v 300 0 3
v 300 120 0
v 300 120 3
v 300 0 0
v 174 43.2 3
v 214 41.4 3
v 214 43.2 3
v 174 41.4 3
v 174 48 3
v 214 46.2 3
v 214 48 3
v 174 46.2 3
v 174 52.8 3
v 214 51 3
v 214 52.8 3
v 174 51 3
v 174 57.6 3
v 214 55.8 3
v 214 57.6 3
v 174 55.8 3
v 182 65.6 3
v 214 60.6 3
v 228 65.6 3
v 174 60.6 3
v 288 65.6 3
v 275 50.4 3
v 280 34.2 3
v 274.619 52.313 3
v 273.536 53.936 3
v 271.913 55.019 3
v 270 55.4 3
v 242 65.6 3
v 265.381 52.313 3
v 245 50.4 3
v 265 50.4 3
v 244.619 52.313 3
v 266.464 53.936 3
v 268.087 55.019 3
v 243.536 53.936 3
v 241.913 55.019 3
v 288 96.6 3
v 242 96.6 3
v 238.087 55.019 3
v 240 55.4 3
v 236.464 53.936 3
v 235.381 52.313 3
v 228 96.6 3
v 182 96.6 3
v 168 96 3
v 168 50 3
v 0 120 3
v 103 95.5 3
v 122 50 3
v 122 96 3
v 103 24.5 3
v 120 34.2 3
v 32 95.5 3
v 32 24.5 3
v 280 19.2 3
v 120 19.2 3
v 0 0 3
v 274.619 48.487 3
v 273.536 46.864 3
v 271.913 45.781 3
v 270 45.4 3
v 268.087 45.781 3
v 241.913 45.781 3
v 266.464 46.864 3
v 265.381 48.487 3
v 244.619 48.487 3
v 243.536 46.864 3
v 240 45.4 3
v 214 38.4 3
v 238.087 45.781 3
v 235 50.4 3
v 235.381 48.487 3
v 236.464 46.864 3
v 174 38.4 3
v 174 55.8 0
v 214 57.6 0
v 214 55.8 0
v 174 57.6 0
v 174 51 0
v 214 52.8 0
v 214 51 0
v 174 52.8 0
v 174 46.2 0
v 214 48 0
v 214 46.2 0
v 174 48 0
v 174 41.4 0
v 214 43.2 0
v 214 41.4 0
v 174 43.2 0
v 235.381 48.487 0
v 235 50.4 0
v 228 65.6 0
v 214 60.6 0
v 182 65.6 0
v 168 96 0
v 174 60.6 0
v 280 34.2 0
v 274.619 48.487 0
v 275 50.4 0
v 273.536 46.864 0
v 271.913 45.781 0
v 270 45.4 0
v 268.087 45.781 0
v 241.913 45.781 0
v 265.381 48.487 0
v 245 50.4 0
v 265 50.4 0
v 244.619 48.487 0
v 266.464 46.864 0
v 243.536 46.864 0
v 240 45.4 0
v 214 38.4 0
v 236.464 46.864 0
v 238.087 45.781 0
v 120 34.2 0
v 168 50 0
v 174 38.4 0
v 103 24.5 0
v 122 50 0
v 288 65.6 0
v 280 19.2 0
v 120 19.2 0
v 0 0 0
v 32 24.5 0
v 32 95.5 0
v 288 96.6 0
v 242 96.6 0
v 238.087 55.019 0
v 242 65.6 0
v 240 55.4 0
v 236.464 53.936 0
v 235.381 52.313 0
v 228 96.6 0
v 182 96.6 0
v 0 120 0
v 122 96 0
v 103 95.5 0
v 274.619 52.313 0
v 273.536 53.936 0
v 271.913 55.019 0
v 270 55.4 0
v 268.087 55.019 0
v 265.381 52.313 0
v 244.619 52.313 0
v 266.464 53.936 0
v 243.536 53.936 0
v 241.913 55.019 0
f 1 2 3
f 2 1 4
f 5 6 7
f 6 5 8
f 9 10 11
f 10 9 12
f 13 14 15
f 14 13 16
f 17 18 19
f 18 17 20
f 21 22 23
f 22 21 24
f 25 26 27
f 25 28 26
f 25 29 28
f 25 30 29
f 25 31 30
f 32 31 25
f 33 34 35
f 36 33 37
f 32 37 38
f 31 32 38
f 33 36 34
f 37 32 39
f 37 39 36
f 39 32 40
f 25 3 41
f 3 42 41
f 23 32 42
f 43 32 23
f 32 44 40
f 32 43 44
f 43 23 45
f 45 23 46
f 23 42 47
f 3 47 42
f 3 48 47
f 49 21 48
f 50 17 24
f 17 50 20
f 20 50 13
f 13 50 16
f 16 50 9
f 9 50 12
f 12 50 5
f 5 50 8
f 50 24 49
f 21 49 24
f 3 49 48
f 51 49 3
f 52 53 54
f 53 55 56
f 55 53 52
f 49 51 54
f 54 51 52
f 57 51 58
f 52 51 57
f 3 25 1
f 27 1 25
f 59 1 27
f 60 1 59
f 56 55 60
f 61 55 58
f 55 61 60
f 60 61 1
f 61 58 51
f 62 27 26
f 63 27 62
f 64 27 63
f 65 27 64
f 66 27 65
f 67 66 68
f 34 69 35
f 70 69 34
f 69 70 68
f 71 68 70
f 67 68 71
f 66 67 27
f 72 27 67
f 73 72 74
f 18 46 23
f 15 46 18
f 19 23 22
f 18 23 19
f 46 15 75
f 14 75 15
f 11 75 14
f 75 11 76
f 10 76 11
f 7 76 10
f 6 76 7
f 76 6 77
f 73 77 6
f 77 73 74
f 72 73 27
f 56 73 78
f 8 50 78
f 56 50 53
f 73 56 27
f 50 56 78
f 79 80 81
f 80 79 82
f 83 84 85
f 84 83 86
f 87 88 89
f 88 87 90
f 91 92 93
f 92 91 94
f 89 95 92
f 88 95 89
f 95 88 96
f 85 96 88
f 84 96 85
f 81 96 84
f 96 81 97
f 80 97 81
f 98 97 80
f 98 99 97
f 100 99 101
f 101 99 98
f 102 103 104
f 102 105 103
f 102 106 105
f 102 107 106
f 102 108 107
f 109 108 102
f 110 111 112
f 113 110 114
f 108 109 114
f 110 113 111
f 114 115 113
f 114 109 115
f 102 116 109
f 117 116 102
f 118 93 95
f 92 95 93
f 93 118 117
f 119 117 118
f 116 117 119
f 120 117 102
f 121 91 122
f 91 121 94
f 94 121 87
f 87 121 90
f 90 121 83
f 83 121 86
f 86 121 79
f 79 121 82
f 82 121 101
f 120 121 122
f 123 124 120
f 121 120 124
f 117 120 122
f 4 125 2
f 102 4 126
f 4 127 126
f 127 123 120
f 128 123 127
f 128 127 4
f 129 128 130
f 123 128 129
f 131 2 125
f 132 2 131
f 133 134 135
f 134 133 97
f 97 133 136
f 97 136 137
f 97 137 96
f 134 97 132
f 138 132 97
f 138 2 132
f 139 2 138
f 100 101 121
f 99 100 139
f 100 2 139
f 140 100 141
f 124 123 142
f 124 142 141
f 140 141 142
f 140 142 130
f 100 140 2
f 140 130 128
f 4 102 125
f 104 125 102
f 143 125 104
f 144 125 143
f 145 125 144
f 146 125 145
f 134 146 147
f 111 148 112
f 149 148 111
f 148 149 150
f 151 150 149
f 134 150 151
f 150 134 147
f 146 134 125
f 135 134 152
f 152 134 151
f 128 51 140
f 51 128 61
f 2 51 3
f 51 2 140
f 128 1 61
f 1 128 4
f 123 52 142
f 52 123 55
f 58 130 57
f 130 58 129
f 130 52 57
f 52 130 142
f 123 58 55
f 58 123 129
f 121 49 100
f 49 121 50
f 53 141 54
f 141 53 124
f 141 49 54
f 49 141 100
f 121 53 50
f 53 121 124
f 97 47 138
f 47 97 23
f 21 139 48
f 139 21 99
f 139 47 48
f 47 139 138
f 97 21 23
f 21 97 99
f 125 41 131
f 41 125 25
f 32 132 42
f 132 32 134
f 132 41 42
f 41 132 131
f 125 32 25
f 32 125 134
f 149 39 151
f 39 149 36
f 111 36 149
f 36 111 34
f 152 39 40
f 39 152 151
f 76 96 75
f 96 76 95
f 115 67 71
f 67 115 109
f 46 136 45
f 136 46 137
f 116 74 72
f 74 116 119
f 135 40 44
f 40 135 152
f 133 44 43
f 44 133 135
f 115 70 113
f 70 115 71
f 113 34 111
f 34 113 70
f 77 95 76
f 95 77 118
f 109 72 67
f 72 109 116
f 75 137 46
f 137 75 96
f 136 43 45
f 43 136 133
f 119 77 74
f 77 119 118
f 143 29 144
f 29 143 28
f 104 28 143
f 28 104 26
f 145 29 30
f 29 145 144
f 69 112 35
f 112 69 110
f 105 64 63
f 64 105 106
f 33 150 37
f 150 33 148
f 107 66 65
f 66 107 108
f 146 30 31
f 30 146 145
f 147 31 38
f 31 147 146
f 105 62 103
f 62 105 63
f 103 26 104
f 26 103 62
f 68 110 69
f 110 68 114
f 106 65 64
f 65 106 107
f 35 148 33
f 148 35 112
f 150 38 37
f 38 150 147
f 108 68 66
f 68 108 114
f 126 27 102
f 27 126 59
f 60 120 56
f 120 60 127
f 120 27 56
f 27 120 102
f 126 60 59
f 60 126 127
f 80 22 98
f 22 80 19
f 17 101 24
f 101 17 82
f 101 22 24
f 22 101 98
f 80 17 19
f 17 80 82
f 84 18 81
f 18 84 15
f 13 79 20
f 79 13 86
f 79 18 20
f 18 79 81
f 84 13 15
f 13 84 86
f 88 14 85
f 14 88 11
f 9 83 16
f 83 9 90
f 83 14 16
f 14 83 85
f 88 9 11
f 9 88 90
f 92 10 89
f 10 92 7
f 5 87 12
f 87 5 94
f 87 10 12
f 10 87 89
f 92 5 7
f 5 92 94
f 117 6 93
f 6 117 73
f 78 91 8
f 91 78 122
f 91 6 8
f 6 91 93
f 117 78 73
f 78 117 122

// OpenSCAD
/*
Carbonite control panels

1" = 25.4mm

maximums:
length: 15" (381mm)
width: 5" (127mm)
height: 2"
*/

BASE_LENGTH = 300;
BASE_WIDTH = 120;
BASE_HEIGHT = 50;

SCREEN_LENGTH = 75;
SCREEN_WIDTH = 75;

LARGE_PANEL_LENGTH = 50;
LARGE_PANEL_WIDTH = 50;

SMALL_PANEL_LENGTH = 50;
SMALL_PANEL_WIDTH = 35;

LONG_PANEL_LENGTH = 160;
LONG_PANEL_WIDTH = 15;

VENT_LENGTH = 40;
VENT_WIDTH = 3;

// Adjust these to match the actual hardware
BUTTON_RADIUS = 20;
BUTTON_MOUNT_RADIUS = 10;

WALL_THICKNESS = 3;
FRAME_THICKNESS = 2;

// Render preview
PREVIEW = false;
EXPLODED = true;

// ***
// Call modules here to render them
// ***

// CCP1
// TODO: Panel mounting holes
// TODO: Arduino mount
// Bargraph
// large subpanel/lens (LEDS)
// small subpanel 1 (buttons)
// small subpanel 2 (switch)
// LCD screen frame


cover();

// base
module base(){
    difference(){
        cube([BASE_LENGTH,BASE_WIDTH,BASE_HEIGHT]);
        translate([WALL_THICKNESS,WALL_THICKNESS,WALL_THICKNESS]){
            cube([BASE_LENGTH-(WALL_THICKNESS*2),BASE_WIDTH-(WALL_THICKNESS*2),BASE_HEIGHT]);
        }
    }
}

// cover
module cover(){
    color("red")
    difference(){
        cube([BASE_LENGTH,BASE_WIDTH,WALL_THICKNESS]);
        
        // screen opening
        translate([BASE_LENGTH*.10+FRAME_THICKNESS,(BASE_WIDTH/2)-(SCREEN_WIDTH/2)+FRAME_THICKNESS,-1]){
            cube([SCREEN_LENGTH-(FRAME_THICKNESS*2),SCREEN_WIDTH-(FRAME_THICKNESS*2),WALL_THICKNESS+2]);
        }
        
        // large panel opening
        translate([BASE_LENGTH*.40+FRAME_THICKNESS,BASE_WIDTH*.40+FRAME_THICKNESS,-1]){
            cube([LARGE_PANEL_LENGTH-(FRAME_THICKNESS*2),LARGE_PANEL_WIDTH-(FRAME_THICKNESS*2),WALL_THICKNESS+2]);
        }
        
        // small panel A opening
        translate([BASE_LENGTH*.60+FRAME_THICKNESS,BASE_WIDTH*.53+FRAME_THICKNESS,-1]){
            cube([SMALL_PANEL_LENGTH-(FRAME_THICKNESS*2),SMALL_PANEL_WIDTH-(FRAME_THICKNESS*2),WALL_THICKNESS+2]);
        }
        
        // small panel B opening
        translate([BASE_LENGTH*.80+FRAME_THICKNESS,BASE_WIDTH*.53+FRAME_THICKNESS,-1]){
            cube([SMALL_PANEL_LENGTH-(FRAME_THICKNESS*2),SMALL_PANEL_WIDTH-(FRAME_THICKNESS*2),WALL_THICKNESS+2]);
        }
        
        // knob/button A
        translate([BASE_LENGTH*.80,BASE_WIDTH*.42,-1]){
            cylinder(r=BUTTON_MOUNT_RADIUS/2,h=WALL_THICKNESS+2);
        }
        
        // knob/button B
        translate([BASE_LENGTH*.90,BASE_WIDTH*.42,-1]){
            cylinder(r=BUTTON_MOUNT_RADIUS/2,h=WALL_THICKNESS+2);
        }
        
        // long panel opening
        translate([BASE_LENGTH*.40,BASE_WIDTH*.16,-1]){
            cube([LONG_PANEL_LENGTH,LONG_PANEL_WIDTH,WALL_THICKNESS+2]);
        }
        
        // vents
        translate([BASE_LENGTH*.58,BASE_WIDTH*.48,-1]){
            cube([VENT_LENGTH,VENT_WIDTH,WALL_THICKNESS+2]);
        }
        translate([BASE_LENGTH*.58,BASE_WIDTH*.44,-1]){
            cube([VENT_LENGTH,VENT_WIDTH,WALL_THICKNESS+2]);
        }
        translate([BASE_LENGTH*.58,BASE_WIDTH*.40,-1]){
            cube([VENT_LENGTH,VENT_WIDTH,WALL_THICKNESS+2]);
        }
        translate([BASE_LENGTH*.58,BASE_WIDTH*.36,-1]){
            cube([VENT_LENGTH,VENT_WIDTH,WALL_THICKNESS+2]);
        }
         translate([BASE_LENGTH*.58,BASE_WIDTH*.32,-1]){
            cube([VENT_LENGTH,VENT_WIDTH,WALL_THICKNESS+2]);
        }

    }
}

// screen
module screen(){
    color("white")
    difference(){
        cube([SCREEN_LENGTH,SCREEN_WIDTH,WALL_THICKNESS]);
        translate([FRAME_THICKNESS,FRAME_THICKNESS,-1]){
            cube([SCREEN_LENGTH-(FRAME_THICKNESS*2),SCREEN_WIDTH-(FRAME_THICKNESS*2),WALL_THICKNESS+2]);
        }
    }
}

// large panel
module large_panel(){
    color("yellow",0.2)
    difference(){
        cube([LARGE_PANEL_LENGTH,LARGE_PANEL_WIDTH,WALL_THICKNESS]);
    }
}

module large_frame(){
    color("white")
    difference(){
        cube([LARGE_PANEL_LENGTH,LARGE_PANEL_WIDTH,WALL_THICKNESS]);
        translate([FRAME_THICKNESS,FRAME_THICKNESS,-1]){
            cube([LARGE_PANEL_LENGTH-(FRAME_THICKNESS*2),LARGE_PANEL_WIDTH-(FRAME_THICKNESS*2),WALL_THICKNESS+2]);
        }
    }
}

// small panel
module small_panel(){
    color("yellow",0.2)
    difference(){
        cube([SMALL_PANEL_LENGTH,SMALL_PANEL_WIDTH,WALL_THICKNESS]);
    }
}

module small_frame(){
    color("white")
    difference(){
        cube([SMALL_PANEL_LENGTH,SMALL_PANEL_WIDTH,WALL_THICKNESS]);
        translate([FRAME_THICKNESS,FRAME_THICKNESS,-1]){
            cube([SMALL_PANEL_LENGTH-(FRAME_THICKNESS*2),SMALL_PANEL_WIDTH-(FRAME_THICKNESS*2),WALL_THICKNESS+2]);
        }
    }
}

// long panel
module long_panel(){
    color("yellow",0.2)
    union(){
        cube([LONG_PANEL_LENGTH,LONG_PANEL_WIDTH,WALL_THICKNESS]);
        translate([-LONG_PANEL_WIDTH/2,LONG_PANEL_WIDTH/2,0]){
            rotate([0,0,-45]){
                cube([LONG_PANEL_WIDTH/1.5,LONG_PANEL_WIDTH/1.5,WALL_THICKNESS]);
            }
        }
        translate([LONG_PANEL_LENGTH-(LONG_PANEL_WIDTH/2),LONG_PANEL_WIDTH/2,0]){
            rotate([0,0,-45]){
                cube([LONG_PANEL_WIDTH/1.5,LONG_PANEL_WIDTH/1.5,WALL_THICKNESS]);
            }
        }
    }
}

module knob(){
    color("brown")
    cylinder(r=BUTTON_RADIUS/2,h=WALL_THICKNESS*3);
}

module button(){
    cylinder(r=BUTTON_RADIUS/2,h=WALL_THICKNESS*3);
}


// assemble!
if (PREVIEW){
    color("gray"){
        base();
    }
    if (EXPLODED){
        translate([0,0,BASE_HEIGHT*2]){
            cover();
            translate([BASE_LENGTH*.10,(BASE_WIDTH/2)-(SCREEN_WIDTH/2),BASE_HEIGHT]){
                screen();
            }
            translate([BASE_LENGTH*.40,BASE_WIDTH*.40,BASE_HEIGHT]){
                large_panel();
                translate([0,0,BASE_HEIGHT]){
                    large_frame();
                }
            }
            translate([BASE_LENGTH*.60,BASE_WIDTH*.53,BASE_HEIGHT]){
                small_panel();
                translate([0,0,BASE_HEIGHT]){
                    small_frame();
                }
            }
            translate([BASE_LENGTH*.80,BASE_WIDTH*.53,BASE_HEIGHT]){
                small_panel();
                translate([0,0,BASE_HEIGHT]){
                    small_frame();
                }
            }
            // knob/button A
            translate([BASE_LENGTH*.75,BASE_WIDTH*.42,BASE_HEIGHT]){
                knob();
            }
            // knob/button B
            translate([BASE_LENGTH*.87,BASE_WIDTH*.42,BASE_HEIGHT]){
                knob();
            }        
            translate([BASE_LENGTH*.40,BASE_WIDTH*.16,BASE_HEIGHT]){
                long_panel();
            }
        }
    } else {
        translate([0,0,BASE_HEIGHT]){
            cover();        
            translate([BASE_LENGTH*.10,(BASE_WIDTH/2)-(SCREEN_WIDTH/2),WALL_THICKNESS]){
                screen();
            }        
            translate([BASE_LENGTH*.40,BASE_WIDTH*.40,WALL_THICKNESS]){
                large_panel();
                translate([0,0,WALL_THICKNESS+1.1]){
                    large_frame();
                }
            }
            translate([BASE_LENGTH*.60,BASE_WIDTH*.53,WALL_THICKNESS]){
                small_panel();
                translate([0,0,WALL_THICKNESS+1.1]){
                    small_frame();
                }
            }
            translate([BASE_LENGTH*.80,BASE_WIDTH*.53,WALL_THICKNESS]){
                small_panel();
                translate([0,0,WALL_THICKNESS+1.1]){
                    small_frame();
                }
            }
            translate([BASE_LENGTH*.75,BASE_WIDTH*.42,WALL_THICKNESS]){
                knob();
            }        
            translate([BASE_LENGTH*.87,BASE_WIDTH*.42,WALL_THICKNESS]){
                knob();
            }                
            translate([BASE_LENGTH*.40,BASE_WIDTH*.16,WALL_THICKNESS]){
                long_panel();
            }
        }
    }
}
